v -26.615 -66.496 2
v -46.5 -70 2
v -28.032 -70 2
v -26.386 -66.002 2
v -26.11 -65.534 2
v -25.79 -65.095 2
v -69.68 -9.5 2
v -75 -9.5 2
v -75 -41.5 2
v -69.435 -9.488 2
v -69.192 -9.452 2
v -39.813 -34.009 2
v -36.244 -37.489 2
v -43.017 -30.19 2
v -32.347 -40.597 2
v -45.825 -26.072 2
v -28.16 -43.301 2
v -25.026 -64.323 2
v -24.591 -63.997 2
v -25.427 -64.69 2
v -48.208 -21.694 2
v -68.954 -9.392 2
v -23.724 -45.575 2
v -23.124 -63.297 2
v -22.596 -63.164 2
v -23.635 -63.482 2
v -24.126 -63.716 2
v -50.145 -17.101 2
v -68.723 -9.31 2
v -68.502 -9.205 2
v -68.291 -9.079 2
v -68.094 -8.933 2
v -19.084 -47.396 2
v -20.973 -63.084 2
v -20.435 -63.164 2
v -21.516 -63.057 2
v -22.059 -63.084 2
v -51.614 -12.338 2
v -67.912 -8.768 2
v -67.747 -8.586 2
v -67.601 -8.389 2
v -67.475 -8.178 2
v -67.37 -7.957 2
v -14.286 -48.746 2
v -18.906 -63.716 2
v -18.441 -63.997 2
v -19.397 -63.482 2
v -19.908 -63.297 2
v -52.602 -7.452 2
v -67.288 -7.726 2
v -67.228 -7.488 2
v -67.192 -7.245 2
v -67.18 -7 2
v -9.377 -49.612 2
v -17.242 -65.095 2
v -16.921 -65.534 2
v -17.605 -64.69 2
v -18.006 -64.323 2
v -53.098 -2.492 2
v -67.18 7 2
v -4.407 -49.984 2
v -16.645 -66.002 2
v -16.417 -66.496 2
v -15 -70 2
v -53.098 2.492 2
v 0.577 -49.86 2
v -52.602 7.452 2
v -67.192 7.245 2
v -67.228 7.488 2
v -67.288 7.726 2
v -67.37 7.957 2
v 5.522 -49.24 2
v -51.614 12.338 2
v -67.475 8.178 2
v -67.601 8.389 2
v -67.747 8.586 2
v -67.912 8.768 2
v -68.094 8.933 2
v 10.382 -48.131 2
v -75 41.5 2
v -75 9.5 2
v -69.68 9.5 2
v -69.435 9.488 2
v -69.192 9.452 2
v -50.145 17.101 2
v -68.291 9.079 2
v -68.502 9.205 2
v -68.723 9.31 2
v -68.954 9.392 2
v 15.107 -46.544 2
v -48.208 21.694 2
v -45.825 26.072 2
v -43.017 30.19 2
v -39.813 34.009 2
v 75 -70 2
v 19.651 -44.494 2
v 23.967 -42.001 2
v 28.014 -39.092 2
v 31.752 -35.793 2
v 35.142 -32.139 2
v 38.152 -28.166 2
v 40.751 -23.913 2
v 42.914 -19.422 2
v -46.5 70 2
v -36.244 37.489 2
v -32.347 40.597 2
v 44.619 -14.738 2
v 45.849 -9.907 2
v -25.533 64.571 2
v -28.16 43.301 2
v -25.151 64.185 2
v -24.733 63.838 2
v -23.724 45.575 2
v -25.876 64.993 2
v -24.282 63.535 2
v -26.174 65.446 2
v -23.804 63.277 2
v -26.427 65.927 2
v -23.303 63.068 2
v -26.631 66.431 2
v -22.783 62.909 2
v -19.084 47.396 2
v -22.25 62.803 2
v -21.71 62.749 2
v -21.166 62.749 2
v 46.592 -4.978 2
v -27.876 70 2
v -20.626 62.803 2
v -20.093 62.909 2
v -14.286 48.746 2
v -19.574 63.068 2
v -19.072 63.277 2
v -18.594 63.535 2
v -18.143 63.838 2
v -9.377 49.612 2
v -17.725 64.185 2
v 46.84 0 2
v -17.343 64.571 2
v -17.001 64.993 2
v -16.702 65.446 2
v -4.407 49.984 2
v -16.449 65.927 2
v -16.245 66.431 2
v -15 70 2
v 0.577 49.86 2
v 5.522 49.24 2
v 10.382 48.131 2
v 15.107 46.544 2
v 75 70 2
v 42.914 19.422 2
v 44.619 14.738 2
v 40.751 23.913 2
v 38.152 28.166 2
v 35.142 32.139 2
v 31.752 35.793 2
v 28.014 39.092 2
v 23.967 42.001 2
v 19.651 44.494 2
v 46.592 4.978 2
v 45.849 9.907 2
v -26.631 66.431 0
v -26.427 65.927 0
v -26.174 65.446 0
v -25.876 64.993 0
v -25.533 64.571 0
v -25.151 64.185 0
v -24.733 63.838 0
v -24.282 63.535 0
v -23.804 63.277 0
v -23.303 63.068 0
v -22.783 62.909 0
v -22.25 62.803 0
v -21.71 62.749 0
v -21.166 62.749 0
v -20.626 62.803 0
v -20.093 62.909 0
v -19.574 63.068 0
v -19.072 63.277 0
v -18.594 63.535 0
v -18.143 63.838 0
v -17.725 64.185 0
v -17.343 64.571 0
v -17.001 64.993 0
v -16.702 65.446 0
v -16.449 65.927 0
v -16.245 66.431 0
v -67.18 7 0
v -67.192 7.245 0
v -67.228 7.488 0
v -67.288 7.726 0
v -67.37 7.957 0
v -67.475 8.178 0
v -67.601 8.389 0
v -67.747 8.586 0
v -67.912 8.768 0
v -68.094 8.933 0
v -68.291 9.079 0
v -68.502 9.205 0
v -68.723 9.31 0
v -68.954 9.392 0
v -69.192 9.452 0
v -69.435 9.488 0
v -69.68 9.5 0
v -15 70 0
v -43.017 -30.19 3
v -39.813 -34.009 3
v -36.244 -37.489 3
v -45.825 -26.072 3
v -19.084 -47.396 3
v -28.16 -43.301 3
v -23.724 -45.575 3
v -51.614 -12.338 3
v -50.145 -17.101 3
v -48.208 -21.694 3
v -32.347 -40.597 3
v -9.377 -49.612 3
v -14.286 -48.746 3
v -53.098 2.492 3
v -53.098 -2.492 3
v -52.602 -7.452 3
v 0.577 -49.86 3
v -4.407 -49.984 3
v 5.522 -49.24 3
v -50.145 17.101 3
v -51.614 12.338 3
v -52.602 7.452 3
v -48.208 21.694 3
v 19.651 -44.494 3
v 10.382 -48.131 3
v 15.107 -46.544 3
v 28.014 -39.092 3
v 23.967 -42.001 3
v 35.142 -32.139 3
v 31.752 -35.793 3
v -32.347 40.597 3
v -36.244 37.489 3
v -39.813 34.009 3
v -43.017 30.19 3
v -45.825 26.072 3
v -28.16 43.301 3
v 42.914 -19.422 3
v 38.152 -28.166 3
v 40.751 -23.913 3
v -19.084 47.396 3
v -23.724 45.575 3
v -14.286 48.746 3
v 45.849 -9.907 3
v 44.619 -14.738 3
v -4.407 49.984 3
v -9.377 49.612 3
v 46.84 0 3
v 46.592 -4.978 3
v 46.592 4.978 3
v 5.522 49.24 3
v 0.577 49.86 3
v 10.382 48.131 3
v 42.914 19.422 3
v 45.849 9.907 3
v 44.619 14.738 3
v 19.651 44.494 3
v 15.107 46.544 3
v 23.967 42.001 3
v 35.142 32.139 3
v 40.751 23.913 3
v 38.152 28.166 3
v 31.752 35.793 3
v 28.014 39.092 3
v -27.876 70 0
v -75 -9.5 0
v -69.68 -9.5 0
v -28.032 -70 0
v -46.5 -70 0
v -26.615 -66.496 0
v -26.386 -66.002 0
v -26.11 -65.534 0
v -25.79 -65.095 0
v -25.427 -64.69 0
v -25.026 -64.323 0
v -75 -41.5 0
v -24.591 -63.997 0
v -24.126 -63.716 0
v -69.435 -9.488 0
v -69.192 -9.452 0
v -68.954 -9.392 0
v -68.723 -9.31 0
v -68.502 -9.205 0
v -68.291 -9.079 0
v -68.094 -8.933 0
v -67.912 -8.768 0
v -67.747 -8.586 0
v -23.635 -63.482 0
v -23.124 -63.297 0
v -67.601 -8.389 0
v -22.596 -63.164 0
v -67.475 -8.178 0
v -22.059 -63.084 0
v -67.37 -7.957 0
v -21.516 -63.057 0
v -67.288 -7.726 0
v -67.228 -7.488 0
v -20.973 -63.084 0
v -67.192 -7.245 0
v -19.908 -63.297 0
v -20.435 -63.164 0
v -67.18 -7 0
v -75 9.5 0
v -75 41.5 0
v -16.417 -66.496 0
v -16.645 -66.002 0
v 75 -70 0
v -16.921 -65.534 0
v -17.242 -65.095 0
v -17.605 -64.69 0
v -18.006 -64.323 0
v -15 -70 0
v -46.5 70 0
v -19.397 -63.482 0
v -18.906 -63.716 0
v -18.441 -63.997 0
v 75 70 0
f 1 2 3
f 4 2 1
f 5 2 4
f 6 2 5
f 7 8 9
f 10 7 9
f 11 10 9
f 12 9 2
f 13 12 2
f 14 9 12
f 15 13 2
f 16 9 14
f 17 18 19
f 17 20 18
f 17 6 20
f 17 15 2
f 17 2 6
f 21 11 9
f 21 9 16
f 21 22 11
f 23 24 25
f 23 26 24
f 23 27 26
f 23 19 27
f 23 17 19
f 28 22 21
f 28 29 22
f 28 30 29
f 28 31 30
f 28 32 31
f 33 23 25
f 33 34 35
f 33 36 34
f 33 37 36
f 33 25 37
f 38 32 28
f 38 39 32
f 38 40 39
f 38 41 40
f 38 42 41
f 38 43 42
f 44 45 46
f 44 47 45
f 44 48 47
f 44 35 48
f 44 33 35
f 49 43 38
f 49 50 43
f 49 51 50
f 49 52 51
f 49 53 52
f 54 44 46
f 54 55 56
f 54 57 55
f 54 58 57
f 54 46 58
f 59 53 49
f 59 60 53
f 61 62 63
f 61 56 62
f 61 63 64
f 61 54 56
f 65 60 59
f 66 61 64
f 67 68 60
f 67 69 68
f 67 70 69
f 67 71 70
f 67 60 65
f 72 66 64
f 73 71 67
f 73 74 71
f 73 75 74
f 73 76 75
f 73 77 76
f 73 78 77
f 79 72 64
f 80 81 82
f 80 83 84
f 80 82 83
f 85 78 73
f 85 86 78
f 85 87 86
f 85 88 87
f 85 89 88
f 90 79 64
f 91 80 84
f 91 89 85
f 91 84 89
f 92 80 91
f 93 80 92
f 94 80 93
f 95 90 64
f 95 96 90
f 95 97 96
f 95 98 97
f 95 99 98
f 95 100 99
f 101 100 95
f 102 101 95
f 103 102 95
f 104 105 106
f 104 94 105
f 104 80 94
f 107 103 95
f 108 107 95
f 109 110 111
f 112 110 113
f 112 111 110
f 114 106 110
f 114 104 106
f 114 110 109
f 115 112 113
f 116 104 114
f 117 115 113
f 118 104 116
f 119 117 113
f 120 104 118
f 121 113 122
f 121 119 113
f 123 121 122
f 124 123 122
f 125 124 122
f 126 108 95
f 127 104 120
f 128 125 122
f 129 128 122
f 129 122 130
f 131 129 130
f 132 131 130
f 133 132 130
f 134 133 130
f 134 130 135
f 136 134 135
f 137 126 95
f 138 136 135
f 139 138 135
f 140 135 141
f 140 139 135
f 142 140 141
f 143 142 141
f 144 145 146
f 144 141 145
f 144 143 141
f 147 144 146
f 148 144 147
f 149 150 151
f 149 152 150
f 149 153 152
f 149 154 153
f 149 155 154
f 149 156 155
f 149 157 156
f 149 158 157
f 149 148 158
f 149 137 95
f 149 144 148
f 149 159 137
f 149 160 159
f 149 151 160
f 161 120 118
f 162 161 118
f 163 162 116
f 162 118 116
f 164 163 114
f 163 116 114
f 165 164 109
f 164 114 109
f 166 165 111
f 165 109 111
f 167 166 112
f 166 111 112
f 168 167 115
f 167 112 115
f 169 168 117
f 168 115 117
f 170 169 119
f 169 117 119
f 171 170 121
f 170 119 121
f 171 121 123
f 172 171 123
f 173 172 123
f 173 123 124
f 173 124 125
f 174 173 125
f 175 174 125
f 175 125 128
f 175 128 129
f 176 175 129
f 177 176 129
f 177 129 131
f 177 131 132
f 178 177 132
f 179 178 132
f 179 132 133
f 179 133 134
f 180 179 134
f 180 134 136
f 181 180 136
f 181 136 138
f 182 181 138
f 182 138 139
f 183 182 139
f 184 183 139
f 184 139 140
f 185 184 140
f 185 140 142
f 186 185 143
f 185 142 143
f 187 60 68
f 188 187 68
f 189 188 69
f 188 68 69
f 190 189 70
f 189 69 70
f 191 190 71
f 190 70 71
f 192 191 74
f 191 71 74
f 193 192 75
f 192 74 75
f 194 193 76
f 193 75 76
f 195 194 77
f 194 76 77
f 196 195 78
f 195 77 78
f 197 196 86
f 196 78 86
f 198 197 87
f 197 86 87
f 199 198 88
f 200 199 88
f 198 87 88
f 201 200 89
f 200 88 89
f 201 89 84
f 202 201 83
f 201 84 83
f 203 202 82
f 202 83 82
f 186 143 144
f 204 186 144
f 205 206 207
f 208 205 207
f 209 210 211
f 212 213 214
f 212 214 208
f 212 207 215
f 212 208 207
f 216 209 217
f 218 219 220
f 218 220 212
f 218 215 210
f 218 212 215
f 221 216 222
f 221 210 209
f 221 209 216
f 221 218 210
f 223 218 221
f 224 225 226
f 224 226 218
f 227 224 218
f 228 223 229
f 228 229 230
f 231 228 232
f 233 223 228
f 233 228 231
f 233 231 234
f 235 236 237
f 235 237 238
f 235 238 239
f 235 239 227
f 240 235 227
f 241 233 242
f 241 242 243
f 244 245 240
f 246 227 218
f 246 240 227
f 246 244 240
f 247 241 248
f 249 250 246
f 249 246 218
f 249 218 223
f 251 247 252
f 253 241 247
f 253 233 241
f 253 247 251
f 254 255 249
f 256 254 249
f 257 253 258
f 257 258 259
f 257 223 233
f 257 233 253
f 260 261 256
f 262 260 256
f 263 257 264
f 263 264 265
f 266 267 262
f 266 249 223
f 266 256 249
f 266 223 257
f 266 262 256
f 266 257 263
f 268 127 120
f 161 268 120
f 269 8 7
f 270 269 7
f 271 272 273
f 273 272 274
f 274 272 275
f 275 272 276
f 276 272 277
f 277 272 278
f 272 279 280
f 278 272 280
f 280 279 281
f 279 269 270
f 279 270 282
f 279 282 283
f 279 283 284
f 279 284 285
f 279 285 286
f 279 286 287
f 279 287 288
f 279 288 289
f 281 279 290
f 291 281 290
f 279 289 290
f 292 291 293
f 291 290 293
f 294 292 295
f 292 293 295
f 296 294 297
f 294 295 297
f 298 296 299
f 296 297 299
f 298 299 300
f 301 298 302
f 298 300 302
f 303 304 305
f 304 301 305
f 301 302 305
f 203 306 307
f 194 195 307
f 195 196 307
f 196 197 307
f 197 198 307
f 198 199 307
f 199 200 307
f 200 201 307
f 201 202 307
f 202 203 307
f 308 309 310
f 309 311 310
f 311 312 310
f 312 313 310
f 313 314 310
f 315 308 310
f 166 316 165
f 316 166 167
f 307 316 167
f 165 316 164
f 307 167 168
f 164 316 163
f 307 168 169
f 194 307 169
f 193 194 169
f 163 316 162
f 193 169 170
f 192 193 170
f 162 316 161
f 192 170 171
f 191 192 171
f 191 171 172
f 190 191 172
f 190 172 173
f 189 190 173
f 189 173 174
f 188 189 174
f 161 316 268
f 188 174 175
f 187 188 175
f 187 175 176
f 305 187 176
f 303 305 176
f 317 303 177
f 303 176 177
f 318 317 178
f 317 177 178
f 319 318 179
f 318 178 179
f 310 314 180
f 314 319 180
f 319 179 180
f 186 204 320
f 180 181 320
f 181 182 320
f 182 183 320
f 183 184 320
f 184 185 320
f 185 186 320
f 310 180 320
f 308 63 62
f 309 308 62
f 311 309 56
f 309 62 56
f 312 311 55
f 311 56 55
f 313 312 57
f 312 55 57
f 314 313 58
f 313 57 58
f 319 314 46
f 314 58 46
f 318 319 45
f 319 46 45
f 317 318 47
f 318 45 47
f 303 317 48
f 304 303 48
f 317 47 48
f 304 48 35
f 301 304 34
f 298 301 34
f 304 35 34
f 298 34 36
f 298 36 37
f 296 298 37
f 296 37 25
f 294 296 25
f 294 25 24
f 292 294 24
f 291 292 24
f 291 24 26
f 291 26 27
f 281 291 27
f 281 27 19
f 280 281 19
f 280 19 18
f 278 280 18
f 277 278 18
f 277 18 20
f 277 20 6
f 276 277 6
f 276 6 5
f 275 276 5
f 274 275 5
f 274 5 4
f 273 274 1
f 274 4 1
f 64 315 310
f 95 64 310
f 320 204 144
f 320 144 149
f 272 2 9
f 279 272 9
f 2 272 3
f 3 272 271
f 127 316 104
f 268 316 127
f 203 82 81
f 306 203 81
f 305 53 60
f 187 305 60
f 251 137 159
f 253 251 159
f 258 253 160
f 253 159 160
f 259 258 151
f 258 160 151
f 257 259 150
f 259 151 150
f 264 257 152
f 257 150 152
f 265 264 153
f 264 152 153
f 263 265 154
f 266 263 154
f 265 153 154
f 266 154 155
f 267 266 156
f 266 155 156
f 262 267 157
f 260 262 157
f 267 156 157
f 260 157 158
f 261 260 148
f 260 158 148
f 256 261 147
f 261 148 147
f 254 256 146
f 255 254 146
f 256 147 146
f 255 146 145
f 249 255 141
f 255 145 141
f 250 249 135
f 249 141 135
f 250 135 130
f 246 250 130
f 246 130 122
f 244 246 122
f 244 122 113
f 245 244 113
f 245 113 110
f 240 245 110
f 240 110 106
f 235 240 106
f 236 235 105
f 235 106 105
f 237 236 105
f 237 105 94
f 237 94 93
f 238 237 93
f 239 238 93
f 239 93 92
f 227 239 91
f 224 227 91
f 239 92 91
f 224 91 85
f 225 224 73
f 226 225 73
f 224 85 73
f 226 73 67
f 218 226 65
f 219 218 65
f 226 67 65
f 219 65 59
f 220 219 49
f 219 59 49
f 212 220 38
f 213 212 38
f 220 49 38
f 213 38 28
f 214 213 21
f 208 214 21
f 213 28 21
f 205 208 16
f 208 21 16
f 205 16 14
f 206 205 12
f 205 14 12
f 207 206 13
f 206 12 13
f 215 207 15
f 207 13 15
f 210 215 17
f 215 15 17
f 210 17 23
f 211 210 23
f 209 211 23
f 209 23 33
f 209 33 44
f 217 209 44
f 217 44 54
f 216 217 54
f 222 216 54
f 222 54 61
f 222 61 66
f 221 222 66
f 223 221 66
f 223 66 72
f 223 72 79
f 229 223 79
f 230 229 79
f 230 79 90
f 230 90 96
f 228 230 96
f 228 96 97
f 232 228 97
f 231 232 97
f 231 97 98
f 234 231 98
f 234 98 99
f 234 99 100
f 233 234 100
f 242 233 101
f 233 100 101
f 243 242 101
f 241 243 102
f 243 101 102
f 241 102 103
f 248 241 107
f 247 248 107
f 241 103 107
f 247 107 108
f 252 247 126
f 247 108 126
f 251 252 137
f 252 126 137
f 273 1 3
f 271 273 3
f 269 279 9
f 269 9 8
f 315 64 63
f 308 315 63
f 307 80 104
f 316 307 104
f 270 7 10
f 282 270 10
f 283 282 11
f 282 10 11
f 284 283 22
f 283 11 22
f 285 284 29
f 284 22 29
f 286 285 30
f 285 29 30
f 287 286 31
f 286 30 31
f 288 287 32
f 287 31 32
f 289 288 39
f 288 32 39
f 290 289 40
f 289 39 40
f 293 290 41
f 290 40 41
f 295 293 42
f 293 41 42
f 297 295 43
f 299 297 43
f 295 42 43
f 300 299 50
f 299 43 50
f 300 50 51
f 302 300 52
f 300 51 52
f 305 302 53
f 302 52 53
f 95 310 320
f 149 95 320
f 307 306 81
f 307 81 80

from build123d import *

# Parameters (mm, degrees)
F0_W     = 150
F0_H     = 140
F1_DEPTH = 2
F3_DEPTH = 2.001
F5_DEPTH = 2.001
F7_DEPTH = 2.001
F8_R     = 50
F9_DEPTH = 1


with BuildPart() as f1:
    # F0 (on Top) → F1 (new body)
    with BuildSketch(Plane.XY):
        Rectangle(F0_W, F0_H)
    extrude(amount=F1_DEPTH)

    # F2 (on face) → F3 (cut, through all)
    with BuildSketch(Plane.XY.offset(2)):
        Polygon((-75, 70), (-75, 41.5), (-46.5, 70), align=None)
        Polygon((-46.5, -70), (-75, -41.5), (-75, -70), align=None)
    extrude(amount=-F3_DEPTH, mode=Mode.SUBTRACT)

    # F4 (on face) → F5 (cut, through all)
    with BuildSketch(Plane.XY.offset(2)):
        with BuildLine():
            Line((-69.68, 9.5), (-75, 9.5))
            Line((-75, 9.5), (-75, -9.5))
            Line((-75, -9.5), (-69.68, -9.5))
            ThreePointArc((-69.68, -9.5), (-67.912233, -8.767767), (-67.18, -7))
            Line((-67.18, -7), (-67.18, 7))
            ThreePointArc((-67.18, 7), (-67.912233, 8.767767), (-69.68, 9.5))
        make_face()
    extrude(amount=-F5_DEPTH, mode=Mode.SUBTRACT)

    # F6 (on face) → F7 (cut, through all)
    with BuildSketch(Plane.XY.offset(2)):
        with BuildLine():
            Line((-28.031671, -70), (-15, -70))
            Line((-15, -70), (-16.416769, -66.495551))
            ThreePointArc((-16.416769, -66.495551), (-21.515836, -63.056988), (-26.614902, -66.495551))
            Line((-26.614902, -66.495551), (-28.031671, -70))
        make_face()
        with BuildLine():
            Line((-27.876137, 70), (-26.631231, 66.430881))
            ThreePointArc((-26.631231, 66.430881), (-21.438069, 62.742254), (-16.244907, 66.430881))
            Line((-16.244907, 66.430881), (-15, 70))
            Line((-15, 70), (-27.876137, 70))
        make_face()
    extrude(amount=-F7_DEPTH, mode=Mode.SUBTRACT)

    # F8 (on face) → F9 (join)
    with BuildSketch(Plane.XY.offset(2)):
        with Locations((-3.16, 0)):
            Circle(F8_R)
    extrude(amount=F9_DEPTH)


solid = f1.part
